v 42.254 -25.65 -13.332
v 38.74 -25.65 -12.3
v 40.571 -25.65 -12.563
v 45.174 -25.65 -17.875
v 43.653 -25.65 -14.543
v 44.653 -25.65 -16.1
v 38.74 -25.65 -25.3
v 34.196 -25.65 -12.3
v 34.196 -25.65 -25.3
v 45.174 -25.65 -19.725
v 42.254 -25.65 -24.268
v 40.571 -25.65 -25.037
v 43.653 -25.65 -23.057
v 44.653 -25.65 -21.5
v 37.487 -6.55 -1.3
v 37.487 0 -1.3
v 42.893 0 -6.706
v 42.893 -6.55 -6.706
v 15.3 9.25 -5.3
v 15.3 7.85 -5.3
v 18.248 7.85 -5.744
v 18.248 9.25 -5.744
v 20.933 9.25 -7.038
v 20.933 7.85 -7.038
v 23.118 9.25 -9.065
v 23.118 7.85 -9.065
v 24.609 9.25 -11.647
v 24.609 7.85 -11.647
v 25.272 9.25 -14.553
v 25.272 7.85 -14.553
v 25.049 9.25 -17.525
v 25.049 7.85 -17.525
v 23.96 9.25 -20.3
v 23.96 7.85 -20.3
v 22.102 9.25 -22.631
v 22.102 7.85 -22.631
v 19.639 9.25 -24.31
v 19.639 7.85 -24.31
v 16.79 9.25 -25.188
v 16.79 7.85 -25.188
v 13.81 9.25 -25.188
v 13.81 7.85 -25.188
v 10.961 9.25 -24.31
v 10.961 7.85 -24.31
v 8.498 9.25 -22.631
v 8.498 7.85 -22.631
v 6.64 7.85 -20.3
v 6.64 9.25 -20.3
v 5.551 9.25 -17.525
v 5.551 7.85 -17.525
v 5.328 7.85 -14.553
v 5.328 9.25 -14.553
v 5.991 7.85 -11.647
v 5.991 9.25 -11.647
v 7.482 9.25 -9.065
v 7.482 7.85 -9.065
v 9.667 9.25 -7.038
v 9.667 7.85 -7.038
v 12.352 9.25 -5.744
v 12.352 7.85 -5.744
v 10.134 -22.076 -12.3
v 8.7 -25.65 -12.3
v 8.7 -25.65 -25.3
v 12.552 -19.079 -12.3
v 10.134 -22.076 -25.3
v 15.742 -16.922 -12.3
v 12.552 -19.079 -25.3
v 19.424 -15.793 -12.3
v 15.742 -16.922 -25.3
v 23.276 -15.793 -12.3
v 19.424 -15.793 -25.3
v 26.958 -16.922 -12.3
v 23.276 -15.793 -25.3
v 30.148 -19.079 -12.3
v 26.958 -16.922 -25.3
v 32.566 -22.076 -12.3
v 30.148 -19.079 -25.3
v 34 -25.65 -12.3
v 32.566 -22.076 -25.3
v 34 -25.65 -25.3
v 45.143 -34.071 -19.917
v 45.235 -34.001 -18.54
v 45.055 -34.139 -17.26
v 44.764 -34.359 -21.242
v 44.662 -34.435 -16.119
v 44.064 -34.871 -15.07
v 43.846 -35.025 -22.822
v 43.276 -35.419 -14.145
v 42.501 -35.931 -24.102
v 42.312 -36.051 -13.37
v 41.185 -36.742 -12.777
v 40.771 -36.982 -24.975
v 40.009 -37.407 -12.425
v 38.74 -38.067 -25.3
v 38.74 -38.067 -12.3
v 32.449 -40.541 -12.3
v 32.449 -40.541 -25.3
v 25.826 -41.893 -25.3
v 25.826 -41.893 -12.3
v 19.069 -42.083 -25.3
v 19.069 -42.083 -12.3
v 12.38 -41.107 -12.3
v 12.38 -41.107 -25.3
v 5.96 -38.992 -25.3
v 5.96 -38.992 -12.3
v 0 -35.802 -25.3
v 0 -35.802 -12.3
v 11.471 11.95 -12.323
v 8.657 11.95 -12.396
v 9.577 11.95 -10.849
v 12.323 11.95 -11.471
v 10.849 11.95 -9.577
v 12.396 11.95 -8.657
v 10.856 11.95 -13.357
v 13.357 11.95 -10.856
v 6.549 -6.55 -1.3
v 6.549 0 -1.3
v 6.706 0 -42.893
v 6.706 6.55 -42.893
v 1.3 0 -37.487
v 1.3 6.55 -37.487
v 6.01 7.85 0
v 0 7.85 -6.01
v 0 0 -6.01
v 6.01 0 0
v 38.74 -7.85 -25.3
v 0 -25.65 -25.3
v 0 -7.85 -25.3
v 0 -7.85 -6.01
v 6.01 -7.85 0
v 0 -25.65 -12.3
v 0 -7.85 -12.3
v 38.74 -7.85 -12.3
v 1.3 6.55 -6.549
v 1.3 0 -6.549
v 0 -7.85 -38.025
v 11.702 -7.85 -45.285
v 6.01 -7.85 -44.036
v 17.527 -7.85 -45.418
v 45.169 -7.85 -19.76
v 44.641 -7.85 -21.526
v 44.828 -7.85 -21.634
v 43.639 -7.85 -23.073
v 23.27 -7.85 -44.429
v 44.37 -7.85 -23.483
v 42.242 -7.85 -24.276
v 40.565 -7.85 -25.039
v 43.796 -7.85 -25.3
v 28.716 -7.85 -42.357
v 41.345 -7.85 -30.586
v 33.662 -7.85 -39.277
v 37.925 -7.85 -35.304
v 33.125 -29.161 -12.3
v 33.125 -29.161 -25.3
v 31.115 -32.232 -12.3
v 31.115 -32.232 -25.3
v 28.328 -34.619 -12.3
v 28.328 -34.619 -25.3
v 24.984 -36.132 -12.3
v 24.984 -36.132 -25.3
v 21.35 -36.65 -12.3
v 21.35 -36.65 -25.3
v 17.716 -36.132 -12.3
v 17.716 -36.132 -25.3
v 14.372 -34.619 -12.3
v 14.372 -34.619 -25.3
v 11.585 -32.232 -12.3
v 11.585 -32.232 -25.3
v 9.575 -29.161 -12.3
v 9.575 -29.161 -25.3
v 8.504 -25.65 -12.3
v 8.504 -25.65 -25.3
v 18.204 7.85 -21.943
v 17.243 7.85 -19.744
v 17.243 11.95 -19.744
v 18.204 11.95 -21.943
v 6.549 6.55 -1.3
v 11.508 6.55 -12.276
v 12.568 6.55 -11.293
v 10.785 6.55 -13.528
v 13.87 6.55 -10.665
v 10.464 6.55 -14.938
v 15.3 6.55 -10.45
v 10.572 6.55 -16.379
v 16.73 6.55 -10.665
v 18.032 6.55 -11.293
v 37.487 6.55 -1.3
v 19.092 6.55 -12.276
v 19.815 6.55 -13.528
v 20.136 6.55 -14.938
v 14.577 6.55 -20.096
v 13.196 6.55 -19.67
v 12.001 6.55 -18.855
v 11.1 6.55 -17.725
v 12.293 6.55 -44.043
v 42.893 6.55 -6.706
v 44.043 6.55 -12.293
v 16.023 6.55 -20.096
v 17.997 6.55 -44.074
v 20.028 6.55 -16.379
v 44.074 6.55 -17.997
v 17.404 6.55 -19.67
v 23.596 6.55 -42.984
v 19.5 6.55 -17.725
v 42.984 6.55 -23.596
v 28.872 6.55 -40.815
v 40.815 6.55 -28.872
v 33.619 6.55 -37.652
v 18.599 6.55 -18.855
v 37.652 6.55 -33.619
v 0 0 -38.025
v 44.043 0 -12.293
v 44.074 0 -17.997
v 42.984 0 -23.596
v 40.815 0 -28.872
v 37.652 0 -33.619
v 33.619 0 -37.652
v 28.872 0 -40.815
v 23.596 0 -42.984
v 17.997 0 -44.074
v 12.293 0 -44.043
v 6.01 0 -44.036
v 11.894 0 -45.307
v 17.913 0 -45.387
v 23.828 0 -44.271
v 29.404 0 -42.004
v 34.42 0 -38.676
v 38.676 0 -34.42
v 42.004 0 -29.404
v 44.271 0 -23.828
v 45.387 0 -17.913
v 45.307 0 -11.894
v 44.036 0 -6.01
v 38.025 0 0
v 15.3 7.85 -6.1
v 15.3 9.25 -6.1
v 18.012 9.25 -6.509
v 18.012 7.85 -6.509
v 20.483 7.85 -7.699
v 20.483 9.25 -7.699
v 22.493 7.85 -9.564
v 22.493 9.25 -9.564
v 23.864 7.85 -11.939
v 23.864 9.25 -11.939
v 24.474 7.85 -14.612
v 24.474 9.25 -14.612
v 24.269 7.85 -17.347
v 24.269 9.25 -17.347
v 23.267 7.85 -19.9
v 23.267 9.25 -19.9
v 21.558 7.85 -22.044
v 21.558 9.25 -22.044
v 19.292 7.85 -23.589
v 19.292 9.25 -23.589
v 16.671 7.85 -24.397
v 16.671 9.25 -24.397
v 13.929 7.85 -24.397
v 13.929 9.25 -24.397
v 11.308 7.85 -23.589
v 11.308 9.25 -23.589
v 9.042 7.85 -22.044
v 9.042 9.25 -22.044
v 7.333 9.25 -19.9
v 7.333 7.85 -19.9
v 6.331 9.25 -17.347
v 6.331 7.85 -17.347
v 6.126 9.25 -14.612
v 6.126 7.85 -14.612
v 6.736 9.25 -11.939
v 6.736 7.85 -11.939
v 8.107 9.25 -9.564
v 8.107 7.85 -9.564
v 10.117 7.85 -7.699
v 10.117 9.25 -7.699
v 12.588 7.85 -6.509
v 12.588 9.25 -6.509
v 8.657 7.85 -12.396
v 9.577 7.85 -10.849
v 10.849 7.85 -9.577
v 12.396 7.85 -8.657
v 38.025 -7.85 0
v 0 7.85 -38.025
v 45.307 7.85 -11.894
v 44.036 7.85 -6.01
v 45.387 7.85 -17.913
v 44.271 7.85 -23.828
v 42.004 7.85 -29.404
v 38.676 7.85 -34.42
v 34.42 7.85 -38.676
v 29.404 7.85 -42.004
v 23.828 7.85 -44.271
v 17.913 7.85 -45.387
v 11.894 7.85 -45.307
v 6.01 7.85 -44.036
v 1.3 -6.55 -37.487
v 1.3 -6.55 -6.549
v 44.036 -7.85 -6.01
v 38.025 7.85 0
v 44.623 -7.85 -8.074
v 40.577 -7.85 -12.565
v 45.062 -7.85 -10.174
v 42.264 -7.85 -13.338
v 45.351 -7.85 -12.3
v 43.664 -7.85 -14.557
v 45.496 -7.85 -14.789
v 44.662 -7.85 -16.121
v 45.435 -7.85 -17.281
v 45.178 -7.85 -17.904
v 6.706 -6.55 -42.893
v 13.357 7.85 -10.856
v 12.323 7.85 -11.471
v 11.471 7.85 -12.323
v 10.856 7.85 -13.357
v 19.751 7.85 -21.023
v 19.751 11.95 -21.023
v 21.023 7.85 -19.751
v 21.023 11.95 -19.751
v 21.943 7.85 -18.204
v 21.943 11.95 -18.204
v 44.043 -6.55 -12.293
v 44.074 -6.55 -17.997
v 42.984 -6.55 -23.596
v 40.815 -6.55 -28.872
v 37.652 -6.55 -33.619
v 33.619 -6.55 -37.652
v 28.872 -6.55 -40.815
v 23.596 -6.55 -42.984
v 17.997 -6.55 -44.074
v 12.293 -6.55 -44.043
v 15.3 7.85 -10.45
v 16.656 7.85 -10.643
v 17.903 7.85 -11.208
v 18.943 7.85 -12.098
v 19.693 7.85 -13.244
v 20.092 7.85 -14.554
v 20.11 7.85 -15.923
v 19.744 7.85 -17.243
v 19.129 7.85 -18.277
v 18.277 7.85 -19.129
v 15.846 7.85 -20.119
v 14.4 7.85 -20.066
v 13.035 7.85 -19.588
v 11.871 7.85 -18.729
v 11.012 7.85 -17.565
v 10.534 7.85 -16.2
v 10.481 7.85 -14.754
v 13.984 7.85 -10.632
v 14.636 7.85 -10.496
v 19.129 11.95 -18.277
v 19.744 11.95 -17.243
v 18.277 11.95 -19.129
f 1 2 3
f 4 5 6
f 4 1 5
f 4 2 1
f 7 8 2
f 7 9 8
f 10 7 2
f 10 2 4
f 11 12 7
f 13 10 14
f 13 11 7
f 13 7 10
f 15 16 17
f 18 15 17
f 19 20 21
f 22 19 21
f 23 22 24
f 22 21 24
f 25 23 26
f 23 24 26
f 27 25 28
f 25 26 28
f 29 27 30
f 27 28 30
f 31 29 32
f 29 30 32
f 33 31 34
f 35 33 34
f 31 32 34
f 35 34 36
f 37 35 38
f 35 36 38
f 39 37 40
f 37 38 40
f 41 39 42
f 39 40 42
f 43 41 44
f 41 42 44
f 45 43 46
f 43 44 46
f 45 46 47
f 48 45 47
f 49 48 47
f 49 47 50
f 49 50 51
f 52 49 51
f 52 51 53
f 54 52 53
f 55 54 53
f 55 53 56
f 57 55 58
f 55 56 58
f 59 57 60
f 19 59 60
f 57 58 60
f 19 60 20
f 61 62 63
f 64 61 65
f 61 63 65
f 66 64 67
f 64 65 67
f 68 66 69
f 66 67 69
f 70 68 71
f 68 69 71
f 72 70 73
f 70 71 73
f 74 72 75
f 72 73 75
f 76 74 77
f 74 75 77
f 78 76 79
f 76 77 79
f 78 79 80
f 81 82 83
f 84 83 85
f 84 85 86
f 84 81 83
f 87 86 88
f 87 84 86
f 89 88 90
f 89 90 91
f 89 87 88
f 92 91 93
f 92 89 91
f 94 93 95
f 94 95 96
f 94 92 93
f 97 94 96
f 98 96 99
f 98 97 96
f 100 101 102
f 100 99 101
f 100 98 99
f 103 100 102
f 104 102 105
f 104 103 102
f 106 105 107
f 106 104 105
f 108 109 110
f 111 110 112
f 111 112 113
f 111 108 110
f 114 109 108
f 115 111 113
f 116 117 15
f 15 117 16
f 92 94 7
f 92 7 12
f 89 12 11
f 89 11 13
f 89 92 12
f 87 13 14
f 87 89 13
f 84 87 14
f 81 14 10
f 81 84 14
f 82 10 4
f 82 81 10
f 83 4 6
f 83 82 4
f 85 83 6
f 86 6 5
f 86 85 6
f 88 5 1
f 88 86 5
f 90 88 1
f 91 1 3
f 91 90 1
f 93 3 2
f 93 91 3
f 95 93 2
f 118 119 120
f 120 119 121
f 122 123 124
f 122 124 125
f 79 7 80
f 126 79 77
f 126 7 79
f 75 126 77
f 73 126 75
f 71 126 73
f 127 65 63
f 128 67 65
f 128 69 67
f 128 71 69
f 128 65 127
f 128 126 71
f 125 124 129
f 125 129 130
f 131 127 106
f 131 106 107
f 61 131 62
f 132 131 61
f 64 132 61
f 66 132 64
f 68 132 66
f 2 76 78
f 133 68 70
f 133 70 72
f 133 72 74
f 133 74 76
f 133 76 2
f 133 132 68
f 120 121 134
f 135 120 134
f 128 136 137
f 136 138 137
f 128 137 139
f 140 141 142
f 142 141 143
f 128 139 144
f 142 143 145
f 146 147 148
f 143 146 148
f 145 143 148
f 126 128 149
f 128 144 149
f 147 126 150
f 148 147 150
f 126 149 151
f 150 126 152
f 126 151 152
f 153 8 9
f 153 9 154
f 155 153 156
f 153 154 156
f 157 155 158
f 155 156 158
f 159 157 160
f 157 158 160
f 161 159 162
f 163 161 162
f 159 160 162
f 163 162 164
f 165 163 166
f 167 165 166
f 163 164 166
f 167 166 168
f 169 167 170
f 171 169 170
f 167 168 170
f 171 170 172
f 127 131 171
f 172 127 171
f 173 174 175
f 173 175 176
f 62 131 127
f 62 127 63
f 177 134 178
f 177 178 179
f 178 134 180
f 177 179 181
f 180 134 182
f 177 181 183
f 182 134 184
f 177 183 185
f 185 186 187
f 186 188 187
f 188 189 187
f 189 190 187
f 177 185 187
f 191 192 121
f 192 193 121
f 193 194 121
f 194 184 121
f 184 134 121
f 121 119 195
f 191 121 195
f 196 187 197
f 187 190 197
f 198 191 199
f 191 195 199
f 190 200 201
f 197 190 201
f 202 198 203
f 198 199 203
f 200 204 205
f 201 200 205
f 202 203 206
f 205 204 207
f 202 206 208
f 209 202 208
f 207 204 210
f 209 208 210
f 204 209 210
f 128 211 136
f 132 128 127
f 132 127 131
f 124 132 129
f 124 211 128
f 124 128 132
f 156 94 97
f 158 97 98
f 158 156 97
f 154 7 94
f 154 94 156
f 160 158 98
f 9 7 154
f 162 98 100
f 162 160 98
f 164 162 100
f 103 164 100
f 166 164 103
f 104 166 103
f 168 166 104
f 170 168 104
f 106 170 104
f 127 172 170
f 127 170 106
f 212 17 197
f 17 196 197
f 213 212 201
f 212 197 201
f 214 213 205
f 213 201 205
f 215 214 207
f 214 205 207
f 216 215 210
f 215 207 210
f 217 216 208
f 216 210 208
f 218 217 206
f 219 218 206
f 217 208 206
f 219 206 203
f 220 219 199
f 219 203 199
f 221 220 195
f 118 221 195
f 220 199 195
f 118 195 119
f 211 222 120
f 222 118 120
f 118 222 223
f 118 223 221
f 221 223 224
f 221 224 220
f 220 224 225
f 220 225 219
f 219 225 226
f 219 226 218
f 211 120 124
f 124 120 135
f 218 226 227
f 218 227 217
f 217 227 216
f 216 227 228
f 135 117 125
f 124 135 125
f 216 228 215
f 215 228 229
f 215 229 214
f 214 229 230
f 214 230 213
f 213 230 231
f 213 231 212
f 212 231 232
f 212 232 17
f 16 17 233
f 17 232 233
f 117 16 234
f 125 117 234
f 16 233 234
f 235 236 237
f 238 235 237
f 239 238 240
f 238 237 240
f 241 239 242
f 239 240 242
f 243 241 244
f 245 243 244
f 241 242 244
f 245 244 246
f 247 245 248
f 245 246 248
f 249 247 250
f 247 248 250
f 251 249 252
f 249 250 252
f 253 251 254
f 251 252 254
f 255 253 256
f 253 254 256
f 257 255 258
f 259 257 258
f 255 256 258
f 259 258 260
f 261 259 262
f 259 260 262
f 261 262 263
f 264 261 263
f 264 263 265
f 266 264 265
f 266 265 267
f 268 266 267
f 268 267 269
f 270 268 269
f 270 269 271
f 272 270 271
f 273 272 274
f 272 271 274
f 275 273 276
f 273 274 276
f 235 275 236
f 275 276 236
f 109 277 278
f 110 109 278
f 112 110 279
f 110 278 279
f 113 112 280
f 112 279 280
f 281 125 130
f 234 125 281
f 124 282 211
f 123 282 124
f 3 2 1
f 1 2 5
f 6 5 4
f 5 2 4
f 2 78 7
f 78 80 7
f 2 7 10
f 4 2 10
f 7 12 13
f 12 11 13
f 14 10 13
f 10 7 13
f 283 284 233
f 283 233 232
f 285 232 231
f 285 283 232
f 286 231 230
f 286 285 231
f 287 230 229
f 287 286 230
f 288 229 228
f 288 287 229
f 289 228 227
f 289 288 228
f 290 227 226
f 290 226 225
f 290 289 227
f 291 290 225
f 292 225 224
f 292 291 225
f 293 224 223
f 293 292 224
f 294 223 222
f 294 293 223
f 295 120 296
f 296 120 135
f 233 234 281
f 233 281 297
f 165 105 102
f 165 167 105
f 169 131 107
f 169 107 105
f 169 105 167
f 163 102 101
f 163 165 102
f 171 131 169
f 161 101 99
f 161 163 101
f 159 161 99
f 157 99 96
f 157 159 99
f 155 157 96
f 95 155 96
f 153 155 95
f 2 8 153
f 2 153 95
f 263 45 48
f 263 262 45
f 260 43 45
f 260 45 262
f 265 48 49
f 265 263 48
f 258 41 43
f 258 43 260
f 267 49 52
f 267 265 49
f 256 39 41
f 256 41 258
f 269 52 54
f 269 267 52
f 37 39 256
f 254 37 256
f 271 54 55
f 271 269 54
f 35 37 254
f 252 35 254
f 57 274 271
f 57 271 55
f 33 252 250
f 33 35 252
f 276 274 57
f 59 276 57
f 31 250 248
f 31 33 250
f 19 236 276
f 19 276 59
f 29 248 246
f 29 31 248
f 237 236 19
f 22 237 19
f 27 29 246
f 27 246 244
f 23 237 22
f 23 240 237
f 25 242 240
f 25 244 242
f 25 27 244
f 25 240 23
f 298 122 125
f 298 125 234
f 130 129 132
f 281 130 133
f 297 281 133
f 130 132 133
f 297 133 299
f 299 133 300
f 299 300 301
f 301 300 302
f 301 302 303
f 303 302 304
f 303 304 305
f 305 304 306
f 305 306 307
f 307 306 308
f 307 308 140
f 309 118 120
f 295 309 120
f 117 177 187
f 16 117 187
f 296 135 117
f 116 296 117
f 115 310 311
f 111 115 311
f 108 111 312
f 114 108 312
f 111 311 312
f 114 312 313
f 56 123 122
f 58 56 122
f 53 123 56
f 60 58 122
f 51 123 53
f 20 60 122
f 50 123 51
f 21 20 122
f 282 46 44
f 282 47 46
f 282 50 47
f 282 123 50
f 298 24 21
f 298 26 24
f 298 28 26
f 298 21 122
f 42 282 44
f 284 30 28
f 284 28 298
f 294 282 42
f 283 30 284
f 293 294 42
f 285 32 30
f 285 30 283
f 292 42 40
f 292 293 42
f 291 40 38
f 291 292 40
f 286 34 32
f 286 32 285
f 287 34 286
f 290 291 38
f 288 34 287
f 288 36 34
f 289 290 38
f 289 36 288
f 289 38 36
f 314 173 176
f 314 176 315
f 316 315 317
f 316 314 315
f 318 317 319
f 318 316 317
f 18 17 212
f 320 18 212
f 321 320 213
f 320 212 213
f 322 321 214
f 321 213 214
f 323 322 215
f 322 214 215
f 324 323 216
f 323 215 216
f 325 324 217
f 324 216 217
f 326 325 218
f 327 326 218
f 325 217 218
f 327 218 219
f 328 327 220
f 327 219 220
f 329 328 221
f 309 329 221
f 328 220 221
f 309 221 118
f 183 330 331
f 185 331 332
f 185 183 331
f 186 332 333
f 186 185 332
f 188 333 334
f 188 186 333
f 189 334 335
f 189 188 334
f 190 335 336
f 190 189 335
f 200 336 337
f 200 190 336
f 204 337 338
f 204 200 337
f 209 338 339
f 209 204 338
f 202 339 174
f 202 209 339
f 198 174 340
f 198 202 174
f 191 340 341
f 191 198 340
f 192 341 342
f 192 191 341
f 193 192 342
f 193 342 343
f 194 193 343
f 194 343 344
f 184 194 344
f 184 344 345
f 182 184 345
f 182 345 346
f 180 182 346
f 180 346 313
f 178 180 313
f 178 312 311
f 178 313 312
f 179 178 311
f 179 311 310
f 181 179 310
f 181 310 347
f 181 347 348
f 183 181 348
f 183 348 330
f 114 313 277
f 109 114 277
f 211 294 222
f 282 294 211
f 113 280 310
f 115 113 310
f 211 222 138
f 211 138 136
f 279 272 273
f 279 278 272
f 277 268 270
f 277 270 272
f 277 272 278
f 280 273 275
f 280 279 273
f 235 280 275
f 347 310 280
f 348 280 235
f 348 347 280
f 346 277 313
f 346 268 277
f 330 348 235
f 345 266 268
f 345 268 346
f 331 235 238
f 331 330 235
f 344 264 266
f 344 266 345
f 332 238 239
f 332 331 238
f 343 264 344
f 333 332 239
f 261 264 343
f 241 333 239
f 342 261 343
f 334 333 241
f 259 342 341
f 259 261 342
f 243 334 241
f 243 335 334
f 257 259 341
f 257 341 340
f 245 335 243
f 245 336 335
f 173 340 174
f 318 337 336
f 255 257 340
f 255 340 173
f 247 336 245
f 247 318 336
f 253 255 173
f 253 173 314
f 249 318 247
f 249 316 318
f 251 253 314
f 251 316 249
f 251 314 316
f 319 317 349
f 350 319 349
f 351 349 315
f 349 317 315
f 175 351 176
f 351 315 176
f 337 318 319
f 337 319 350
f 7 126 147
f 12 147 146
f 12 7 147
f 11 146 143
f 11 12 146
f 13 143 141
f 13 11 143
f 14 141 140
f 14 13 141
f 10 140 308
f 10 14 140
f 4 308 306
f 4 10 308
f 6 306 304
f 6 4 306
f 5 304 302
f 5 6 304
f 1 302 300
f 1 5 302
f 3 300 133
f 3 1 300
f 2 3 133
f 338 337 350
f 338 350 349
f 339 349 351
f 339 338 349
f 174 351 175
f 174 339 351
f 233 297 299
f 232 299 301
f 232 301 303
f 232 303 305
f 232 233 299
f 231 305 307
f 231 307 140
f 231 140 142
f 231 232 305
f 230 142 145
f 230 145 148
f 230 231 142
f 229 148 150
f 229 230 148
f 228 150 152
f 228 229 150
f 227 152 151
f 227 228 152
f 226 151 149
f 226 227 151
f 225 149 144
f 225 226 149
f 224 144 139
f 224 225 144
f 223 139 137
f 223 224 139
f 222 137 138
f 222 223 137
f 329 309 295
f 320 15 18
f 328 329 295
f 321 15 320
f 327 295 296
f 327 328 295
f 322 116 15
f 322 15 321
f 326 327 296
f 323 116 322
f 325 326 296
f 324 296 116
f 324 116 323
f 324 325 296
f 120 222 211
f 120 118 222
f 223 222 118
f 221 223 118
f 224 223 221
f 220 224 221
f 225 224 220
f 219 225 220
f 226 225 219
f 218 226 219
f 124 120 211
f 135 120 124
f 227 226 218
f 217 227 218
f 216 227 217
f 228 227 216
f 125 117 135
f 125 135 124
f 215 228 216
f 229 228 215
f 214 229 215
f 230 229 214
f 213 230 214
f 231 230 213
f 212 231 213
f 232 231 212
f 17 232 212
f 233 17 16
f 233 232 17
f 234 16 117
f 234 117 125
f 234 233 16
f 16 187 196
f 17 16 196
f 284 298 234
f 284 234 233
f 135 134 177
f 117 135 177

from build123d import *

# Parameters (mm, degrees)
RESSALTO_EXTRUS_O1_DEPTH = 7.85
ESBO_O3_R                = 10
RESSALTO_EXTRUS_O2_DEPTH = 1.4
CASCA1_T                 = -1.3
CASCA2_T                 = -1.3
ESBO_O4_R                = 4.85
CORTE_EXTRUS_O1_DEPTH    = 67.580102133
ESBO_O5_R                = 9.2
CORTE_EXTRUS_O2_DEPTH    = 1.4
RESSALTO_EXTRUS_O5_START = -1.3
ESBO_O7_R                = 8.7
ESBO_O7_R_2              = 4.85
RESSALTO_EXTRUS_O5_DEPTH = 1.3
RESSALTO_EXTRUS_O3_DEPTH = 4.1
RESSALTO_EXTRUS_O6_DEPTH = 34.3
CORTE_EXTRUS_O4_DEPTH    = 34.3
ESBO_O10_R               = 13.001125
CORTE_EXTRUS_O3_DEPTH    = 20
ESBO_O12_R               = 58.064815878
ESBO_O12_R_2             = 39.076522869
ESBO_O12_R_3             = 13.001125
CORTE_EXTRUS_O5_DEPTH    = 13


# Read off the part's stored shape, not the designer's step: Dividir2
with BuildPart() as part:
    # Esboço1 → Ressalto-extrusão1 (new, symmetric)
    with BuildSketch(Plane(origin=(0, 0, 0), x_dir=(1, 0, 0), z_dir=(0, 1, 0))):
        with BuildLine():
            Line((0, 6.01040764), (6.01040764, 0))
            Line((6.01040764, 0), (38.025344896, 0))
            Line((38.025344896, 0), (44.035752536, 6.01040764))
            ThreePointArc((44.035752536, 6.01040764), (36.654624792, 36.654624792), (6.01040764, 44.035752536))
            Line((6.01040764, 44.035752536), (0, 38.025344896))
            Line((0, 38.025344896), (0, 6.01040764))
        make_face()
    extrude(amount=RESSALTO_EXTRUS_O1_DEPTH, both=True)

    # Esboço3 → Ressalto-extrusão2 (add)
    with BuildSketch(Plane(origin=(0, 7.85, 0), x_dir=(1, 0, 0), z_dir=(0, 1, 0))):
        with Locations(Location((15.3, 15.3, 0), (0, 0, 270))):
            Circle(ESBO_O3_R)
    extrude(amount=RESSALTO_EXTRUS_O2_DEPTH)


with BuildPart() as body_2:
    # Dividir1: the piece on the far side of the plane
    add(part.part)
    split(bisect_by=Plane.ZX, keep=Keep.BOTTOM)

    # Casca1
    casca1_openings = [body_2.faces().sort_by_distance(p)[0] for p in [
        (21.196466448, 0, -21.196466448),
    ]]
    offset(amount=CASCA1_T, openings=casca1_openings, kind=Kind.INTERSECTION)

    # Esboço8 → Ressalto-extrusão6 (add)
    with BuildSketch(Plane.XZ.offset(7.85)):
        with BuildLine():
            Line((0, -12.3), (45.350623954, -12.3))
            ThreePointArc((45.350623954, -12.3), (45.286430787, -18.885243179), (43.796315551, -25.3))
            Line((43.796315551, -25.3), (0, -25.3))
            Line((0, -25.3), (0, -12.3))
        make_face()
    extrude(amount=RESSALTO_EXTRUS_O6_DEPTH)

    # Esboço11 → Corte-extrusão4 (cut)
    with BuildSketch(Plane.XZ.offset(42.15)):
        with BuildLine():
            Line((38.740136518, -12.3), (51.009297324, -12.3))
            Line((51.009297324, -12.3), (51.009297324, -25.3))
            Line((51.009297324, -25.3), (38.740136518, -25.3))
            ThreePointArc((38.740136518, -25.3), (45.240136518, -18.8), (38.740136518, -12.3))
        make_face()
    extrude(amount=-CORTE_EXTRUS_O4_DEPTH, mode=Mode.SUBTRACT)


with BuildPart() as part_1:
    add(part.part)

    # Dividir1
    split(bisect_by=Plane.ZX, keep=Keep.TOP)

    # Casca2
    casca2_openings = [part_1.faces().sort_by_distance(p)[0] for p in [
        (21.196466448, 0, -21.196466448),
    ]]
    offset(amount=CASCA2_T, openings=casca2_openings, kind=Kind.INTERSECTION)

    # Esboço4 → Corte-extrusão1 (cut, through all)
    with BuildSketch(Plane(origin=(0, 9.25, 0), x_dir=(1, 0, 0), z_dir=(0, 1, 0))):
        with Locations(Location((15.3, 15.3, 0), (0, 0, 270))):
            Circle(ESBO_O4_R)
    extrude(amount=-CORTE_EXTRUS_O1_DEPTH, mode=Mode.SUBTRACT)

    # Esboço5 → Corte-extrusão2 (cut)
    with BuildSketch(Plane(origin=(0, 9.25, 0), x_dir=(1, 0, 0), z_dir=(0, 1, 0))):
        with Locations(Location((15.3, 15.3, 0), (0, 0, 270))):
            Circle(ESBO_O5_R)
    extrude(amount=-CORTE_EXTRUS_O2_DEPTH, mode=Mode.SUBTRACT)

    # Esboço7 → Ressalto-extrusão5 (add)
    with BuildSketch(Plane(origin=(0, 7.85, 0), x_dir=(1, 0, 0), z_dir=(0, 1, 0)).offset(RESSALTO_EXTRUS_O5_START)):
        with Locations((15.3, 15.3)):
            Circle(ESBO_O7_R)
        with Locations(Location((15.3, 15.3, 0), (0, 0, 270))):
            Circle(ESBO_O7_R_2, mode=Mode.SUBTRACT)
    extrude(amount=RESSALTO_EXTRUS_O5_DEPTH)

    # Esboço6 → Ressalto-extrusão3 (add)
    with BuildSketch(Plane(origin=(0, 7.85, 0), x_dir=(1, 0, 0), z_dir=(0, 1, 0))):
        with BuildLine():
            Line((10.856152793, 13.357135619), (8.657135619, 12.395718193))
            ThreePointArc((8.657135619, 12.395718193), (10.173475836, 10.173475836), (12.395718193, 8.657135619))
            Line((12.395718193, 8.657135619), (13.357135619, 10.856152793))
            ThreePointArc((13.357135619, 10.856152793), (11.870532111, 11.870532111), (10.856152793, 13.357135619))
        make_face()
        with BuildLine():
            Line((17.242864381, 19.743847207), (18.204281807, 21.942864381))
            ThreePointArc((18.204281807, 21.942864381), (20.426524164, 20.426524164), (21.942864381, 18.204281807))
            Line((21.942864381, 18.204281807), (19.743847207, 17.242864381))
            ThreePointArc((19.743847207, 17.242864381), (18.729467889, 18.729467889), (17.242864381, 19.743847207))
        make_face()
    extrude(amount=RESSALTO_EXTRUS_O3_DEPTH)


with BuildPart() as body_3:
    # Dividir2: the piece on the far side of the plane
    add(body_2.part)
    split(bisect_by=Plane(origin=(0, -25.65, 0), x_dir=(1, 0, 0), z_dir=(0, 1, 0)), keep=Keep.BOTTOM)

    # Esboço12 → Corte-extrusão5 (cut)
    # profile 1 of 2: a face of its own
    with BuildSketch(Plane(origin=(0, 0, -25.3), x_dir=(-1, 0, 0), z_dir=(0, 0, -1))):
        with Locations((-21.35, -3.073477131)):
            Circle(ESBO_O12_R)
        with Locations((-21.35, -3.073477131)):
            Circle(ESBO_O12_R_2, mode=Mode.SUBTRACT)
    # profile 2 of 2: a face of its own
    with BuildSketch(Plane(origin=(0, 0, -25.3), x_dir=(-1, 0, 0), z_dir=(0, 0, -1))):
        with Locations((-21.35, -23.648875)):
            Circle(ESBO_O12_R_3)
    extrude(amount=-CORTE_EXTRUS_O5_DEPTH, mode=Mode.SUBTRACT)


with BuildPart() as body_2_1:
    add(body_2.part)

    # Dividir2
    split(bisect_by=Plane(origin=(0, -25.65, 0), x_dir=(1, 0, 0), z_dir=(0, 1, 0)), keep=Keep.TOP)

    # Esboço10 → Corte-extrusão3 (cut)
    with BuildSketch(Plane(origin=(0, 0, -25.3), x_dir=(-1, 0, 0), z_dir=(0, 0, -1))):
        with Locations((-21.35, -28.651125)):
            Circle(ESBO_O10_R)
    extrude(amount=-CORTE_EXTRUS_O3_DEPTH, mode=Mode.SUBTRACT)


solid = Compound([part_1.part, body_3.part, body_2_1.part])
